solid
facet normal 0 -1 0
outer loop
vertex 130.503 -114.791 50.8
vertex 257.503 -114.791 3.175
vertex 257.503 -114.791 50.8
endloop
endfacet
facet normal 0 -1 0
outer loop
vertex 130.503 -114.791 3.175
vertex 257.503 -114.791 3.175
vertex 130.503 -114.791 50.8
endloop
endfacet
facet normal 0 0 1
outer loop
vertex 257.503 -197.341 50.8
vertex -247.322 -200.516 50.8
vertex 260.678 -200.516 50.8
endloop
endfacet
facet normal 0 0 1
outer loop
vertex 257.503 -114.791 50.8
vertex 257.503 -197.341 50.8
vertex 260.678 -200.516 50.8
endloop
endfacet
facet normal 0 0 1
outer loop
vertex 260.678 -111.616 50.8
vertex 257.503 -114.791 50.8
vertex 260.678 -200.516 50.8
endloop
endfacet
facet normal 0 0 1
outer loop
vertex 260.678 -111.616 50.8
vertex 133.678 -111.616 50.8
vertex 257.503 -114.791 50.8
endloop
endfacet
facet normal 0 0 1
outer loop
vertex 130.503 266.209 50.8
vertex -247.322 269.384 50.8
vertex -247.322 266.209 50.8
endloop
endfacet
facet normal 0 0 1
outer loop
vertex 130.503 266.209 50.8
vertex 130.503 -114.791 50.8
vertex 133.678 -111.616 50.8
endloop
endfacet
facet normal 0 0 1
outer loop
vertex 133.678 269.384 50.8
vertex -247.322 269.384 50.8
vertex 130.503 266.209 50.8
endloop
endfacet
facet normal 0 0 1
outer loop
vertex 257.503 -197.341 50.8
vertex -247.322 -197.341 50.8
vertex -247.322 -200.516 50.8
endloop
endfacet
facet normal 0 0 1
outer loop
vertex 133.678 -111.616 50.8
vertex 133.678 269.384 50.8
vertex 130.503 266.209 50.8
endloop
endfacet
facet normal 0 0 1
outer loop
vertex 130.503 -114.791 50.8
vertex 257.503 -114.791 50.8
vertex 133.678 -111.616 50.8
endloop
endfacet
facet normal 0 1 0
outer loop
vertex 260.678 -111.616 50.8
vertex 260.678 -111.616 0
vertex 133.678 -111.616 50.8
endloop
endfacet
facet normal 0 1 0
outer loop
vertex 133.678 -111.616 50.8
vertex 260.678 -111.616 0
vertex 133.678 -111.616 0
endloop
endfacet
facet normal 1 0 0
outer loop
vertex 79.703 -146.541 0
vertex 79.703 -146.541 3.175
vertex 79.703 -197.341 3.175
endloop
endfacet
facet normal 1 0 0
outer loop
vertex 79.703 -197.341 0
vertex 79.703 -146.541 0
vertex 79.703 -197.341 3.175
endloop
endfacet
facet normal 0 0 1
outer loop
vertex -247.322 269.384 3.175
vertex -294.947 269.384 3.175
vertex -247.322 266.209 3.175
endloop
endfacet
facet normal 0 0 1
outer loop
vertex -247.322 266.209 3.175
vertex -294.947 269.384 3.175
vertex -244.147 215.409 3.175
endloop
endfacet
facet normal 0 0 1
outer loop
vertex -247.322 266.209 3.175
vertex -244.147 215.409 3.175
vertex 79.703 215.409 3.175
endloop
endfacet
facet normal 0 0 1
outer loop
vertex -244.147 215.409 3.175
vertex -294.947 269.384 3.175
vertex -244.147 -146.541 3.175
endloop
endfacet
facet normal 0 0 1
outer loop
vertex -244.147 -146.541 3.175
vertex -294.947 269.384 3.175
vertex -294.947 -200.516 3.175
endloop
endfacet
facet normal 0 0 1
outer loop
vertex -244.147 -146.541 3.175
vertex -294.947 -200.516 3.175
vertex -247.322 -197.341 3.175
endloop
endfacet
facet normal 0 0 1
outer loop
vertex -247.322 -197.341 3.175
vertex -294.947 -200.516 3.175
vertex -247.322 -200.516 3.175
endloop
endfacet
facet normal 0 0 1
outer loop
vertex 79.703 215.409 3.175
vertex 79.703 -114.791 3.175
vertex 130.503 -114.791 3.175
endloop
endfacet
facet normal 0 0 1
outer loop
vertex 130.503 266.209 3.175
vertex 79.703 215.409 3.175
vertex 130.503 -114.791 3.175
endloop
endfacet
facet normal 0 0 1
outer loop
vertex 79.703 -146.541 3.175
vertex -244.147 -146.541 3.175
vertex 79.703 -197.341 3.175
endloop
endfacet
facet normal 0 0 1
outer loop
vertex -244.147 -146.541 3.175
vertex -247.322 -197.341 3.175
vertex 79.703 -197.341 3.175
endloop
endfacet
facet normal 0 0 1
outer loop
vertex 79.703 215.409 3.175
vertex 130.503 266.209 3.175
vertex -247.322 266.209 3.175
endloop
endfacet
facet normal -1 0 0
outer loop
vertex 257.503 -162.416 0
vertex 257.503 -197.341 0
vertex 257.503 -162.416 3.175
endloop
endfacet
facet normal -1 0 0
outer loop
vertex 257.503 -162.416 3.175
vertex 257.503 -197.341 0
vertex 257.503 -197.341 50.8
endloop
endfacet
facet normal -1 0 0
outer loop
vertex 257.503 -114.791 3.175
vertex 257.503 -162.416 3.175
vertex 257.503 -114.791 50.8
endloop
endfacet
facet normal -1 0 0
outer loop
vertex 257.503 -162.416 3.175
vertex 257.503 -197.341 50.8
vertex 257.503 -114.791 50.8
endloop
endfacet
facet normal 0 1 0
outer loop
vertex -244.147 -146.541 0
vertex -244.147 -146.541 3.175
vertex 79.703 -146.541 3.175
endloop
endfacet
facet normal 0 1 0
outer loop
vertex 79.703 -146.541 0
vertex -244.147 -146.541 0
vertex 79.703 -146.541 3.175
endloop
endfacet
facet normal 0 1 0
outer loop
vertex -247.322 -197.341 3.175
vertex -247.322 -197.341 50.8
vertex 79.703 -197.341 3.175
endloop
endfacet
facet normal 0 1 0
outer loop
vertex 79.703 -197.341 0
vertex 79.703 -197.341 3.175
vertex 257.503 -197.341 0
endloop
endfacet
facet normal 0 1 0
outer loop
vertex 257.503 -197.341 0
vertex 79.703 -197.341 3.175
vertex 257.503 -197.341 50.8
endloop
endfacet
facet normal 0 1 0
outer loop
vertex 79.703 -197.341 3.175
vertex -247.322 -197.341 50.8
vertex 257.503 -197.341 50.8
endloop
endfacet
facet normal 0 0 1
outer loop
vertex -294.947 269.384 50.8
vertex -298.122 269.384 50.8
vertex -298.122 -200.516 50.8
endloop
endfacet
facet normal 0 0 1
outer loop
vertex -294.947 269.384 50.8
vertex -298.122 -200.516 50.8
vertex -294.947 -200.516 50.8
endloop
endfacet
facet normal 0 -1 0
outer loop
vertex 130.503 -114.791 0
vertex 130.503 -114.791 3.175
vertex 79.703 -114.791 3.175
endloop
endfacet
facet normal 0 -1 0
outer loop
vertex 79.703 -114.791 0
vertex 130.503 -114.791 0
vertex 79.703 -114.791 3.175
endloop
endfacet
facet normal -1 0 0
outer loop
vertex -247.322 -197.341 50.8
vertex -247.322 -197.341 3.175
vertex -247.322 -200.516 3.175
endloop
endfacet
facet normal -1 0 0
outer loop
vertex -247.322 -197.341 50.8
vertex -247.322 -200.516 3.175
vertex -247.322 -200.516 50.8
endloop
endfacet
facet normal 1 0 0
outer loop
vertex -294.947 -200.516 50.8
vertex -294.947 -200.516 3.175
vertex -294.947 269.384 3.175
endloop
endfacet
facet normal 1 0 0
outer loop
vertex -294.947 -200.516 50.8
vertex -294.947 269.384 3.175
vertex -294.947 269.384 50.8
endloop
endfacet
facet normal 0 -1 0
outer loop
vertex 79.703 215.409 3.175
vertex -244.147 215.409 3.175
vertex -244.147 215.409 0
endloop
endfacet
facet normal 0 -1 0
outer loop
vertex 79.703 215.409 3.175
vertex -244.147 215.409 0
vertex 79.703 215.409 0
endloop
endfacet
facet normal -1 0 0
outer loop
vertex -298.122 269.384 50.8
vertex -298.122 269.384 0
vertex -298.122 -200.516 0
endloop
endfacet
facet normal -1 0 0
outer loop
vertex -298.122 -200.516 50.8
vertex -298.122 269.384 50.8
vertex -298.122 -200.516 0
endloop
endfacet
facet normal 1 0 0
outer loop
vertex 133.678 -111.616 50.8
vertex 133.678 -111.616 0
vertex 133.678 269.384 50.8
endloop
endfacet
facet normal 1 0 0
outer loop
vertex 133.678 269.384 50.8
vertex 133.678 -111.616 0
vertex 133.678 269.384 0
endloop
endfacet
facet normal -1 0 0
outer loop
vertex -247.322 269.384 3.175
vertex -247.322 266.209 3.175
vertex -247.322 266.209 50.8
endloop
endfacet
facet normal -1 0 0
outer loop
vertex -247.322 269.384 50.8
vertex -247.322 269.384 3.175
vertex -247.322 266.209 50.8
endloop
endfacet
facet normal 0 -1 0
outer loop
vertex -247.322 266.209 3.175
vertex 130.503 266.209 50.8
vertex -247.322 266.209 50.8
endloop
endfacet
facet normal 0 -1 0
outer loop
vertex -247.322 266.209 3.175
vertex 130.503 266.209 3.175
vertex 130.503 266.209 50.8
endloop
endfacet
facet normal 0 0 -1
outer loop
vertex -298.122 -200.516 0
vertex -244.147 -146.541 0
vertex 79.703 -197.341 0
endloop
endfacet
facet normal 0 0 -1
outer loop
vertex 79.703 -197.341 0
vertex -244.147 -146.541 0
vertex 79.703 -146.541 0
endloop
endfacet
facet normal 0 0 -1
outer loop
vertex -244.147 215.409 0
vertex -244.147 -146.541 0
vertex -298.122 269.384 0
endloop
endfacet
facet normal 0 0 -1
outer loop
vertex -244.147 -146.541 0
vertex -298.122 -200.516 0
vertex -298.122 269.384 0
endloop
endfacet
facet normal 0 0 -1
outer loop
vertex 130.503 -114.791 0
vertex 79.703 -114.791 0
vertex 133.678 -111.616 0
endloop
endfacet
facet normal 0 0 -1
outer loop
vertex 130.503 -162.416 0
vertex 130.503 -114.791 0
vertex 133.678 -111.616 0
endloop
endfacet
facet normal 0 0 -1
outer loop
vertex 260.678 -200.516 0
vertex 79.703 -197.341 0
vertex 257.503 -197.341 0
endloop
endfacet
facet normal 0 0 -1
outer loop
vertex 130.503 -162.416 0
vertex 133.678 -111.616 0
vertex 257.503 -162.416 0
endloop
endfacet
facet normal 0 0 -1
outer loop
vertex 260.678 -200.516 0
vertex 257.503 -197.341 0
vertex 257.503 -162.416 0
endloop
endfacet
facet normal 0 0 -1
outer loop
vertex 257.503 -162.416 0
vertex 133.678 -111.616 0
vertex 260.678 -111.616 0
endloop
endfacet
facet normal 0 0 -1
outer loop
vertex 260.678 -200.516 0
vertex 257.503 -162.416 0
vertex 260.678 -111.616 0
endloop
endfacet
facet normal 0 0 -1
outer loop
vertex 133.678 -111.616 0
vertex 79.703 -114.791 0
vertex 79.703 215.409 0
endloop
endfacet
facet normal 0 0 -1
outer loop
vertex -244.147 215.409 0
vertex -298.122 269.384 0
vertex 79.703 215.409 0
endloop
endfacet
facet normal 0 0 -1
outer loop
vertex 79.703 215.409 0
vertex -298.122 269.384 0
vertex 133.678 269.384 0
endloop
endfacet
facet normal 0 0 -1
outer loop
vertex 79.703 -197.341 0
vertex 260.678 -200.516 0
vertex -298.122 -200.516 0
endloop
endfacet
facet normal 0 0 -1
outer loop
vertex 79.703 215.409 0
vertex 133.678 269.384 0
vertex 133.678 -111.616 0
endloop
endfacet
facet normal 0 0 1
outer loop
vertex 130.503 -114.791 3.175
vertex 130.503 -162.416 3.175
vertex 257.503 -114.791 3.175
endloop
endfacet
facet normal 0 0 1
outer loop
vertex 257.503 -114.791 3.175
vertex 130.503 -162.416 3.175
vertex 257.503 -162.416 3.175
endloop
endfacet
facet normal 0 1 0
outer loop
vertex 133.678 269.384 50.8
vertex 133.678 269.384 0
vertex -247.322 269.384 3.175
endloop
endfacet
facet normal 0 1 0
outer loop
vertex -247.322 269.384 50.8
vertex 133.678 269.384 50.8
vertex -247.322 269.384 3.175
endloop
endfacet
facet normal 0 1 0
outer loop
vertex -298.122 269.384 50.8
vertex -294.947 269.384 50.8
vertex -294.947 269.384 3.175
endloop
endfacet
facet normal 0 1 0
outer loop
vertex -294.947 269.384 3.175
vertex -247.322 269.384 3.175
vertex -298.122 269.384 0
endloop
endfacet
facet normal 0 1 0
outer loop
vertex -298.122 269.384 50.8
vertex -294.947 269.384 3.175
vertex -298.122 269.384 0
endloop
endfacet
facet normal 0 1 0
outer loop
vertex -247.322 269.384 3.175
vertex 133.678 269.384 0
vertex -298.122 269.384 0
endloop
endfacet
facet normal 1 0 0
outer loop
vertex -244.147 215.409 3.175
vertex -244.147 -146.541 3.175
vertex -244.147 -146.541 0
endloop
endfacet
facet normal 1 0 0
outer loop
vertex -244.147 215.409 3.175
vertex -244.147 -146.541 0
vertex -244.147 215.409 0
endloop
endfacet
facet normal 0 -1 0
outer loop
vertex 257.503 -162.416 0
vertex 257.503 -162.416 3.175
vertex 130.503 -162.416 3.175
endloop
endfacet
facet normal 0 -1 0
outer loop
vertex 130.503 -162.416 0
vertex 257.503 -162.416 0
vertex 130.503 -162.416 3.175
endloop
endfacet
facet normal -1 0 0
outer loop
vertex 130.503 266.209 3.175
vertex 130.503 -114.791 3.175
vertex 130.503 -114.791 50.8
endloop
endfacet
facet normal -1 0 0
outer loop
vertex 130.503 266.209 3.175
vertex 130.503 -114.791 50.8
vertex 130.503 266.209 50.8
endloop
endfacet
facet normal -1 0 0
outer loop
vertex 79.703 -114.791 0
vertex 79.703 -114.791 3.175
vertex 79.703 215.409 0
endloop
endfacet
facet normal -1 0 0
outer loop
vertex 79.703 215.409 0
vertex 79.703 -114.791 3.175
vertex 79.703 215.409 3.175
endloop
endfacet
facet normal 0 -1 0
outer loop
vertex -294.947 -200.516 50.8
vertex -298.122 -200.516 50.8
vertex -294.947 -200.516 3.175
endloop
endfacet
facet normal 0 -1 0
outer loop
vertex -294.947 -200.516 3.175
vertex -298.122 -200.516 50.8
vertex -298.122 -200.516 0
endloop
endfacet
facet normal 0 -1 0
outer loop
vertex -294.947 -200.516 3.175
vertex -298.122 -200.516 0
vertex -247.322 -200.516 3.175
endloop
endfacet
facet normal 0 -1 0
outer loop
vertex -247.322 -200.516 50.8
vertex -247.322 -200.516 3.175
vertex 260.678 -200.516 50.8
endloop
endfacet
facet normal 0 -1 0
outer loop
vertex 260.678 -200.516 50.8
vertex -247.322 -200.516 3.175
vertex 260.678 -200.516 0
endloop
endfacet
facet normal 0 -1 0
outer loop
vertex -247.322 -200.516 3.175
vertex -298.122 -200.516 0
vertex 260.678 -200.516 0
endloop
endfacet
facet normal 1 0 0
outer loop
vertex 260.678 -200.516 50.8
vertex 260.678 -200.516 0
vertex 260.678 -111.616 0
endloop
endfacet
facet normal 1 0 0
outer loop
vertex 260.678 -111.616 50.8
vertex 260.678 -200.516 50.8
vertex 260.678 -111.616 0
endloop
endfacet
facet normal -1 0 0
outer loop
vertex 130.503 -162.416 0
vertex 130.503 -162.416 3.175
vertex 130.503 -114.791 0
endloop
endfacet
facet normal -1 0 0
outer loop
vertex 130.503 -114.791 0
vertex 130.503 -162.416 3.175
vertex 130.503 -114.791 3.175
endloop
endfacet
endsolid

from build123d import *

# Parameters (mm, degrees)
F1_DEPTH  = 50.8
F2_T      = -3.175
F3_W      = 323.85
F3_H      = 361.95
F4_DEPTH  = 25.4
F5_W      = 47.625
F5_H      = 47.625
F6_DEPTH  = 254
F7_W      = 47.625
F7_H      = 47.625
F8_DEPTH  = 25.4
F10_DEPTH = 25.4


with BuildPart() as f1:
    # F0 (on Top) → F1 (new body)
    with BuildSketch(Plane.XY):
        Polygon((-298.1223497814, 269.3835347245), (-298.1223497814, 0), (-298.1223497814, -200.5164652755), (260.6776502186, -200.5164652755), (260.6776502186, -111.6164652755), (133.6776502186, -111.6164652755), (133.6776502186, 269.3835347245), align=None)
    extrude(amount=F1_DEPTH)

    # F2
    f2_openings = [f1.faces().sort_by_distance(p)[0] for p in [
        (-67.49494, 24.392119, 50.8),
    ]]
    offset(amount=F2_T, openings=f2_openings, kind=Kind.INTERSECTION)

    # F3 (on face) → F4 (cut)
    with BuildSketch(Plane.XY.offset(3.175)):
        with Locations((-82.2223497814, 34.4335347245)):
            Rectangle(F3_W, F3_H)
    extrude(amount=-F4_DEPTH, mode=Mode.SUBTRACT)

    # F5 (on face) → F6 (cut, symmetric)
    with BuildSketch(Plane.XZ.offset(-266.2085347245)):
        with Locations((-271.1348497814, 26.9875)):
            Rectangle(F5_W, F5_H)
    extrude(amount=F6_DEPTH, both=True, mode=Mode.SUBTRACT)

    # F7 (on face) → F8 (cut)
    with BuildSketch(Plane(origin=(0, -197.3414652755, 0), x_dir=(-1, 0, 0), z_dir=(0, 1, 0))):
        with Locations((271.1348497814, 26.9875)):
            Rectangle(F7_W, F7_H)
    extrude(amount=-F8_DEPTH, mode=Mode.SUBTRACT)

    # F9 (on face) → F10 (cut)
    with BuildSketch(Plane.XY.offset(3.175)):
        Polygon((130.5026502186, -162.4164652755), (130.5026502186, -114.7914652755), (79.7026502186, -114.7914652755), (79.7026502186, -197.3414652755), (257.5026502186, -197.3414652755), (257.5026502186, -162.4164652755), align=None)
    extrude(amount=-F10_DEPTH, mode=Mode.SUBTRACT)


solid = f1.part
